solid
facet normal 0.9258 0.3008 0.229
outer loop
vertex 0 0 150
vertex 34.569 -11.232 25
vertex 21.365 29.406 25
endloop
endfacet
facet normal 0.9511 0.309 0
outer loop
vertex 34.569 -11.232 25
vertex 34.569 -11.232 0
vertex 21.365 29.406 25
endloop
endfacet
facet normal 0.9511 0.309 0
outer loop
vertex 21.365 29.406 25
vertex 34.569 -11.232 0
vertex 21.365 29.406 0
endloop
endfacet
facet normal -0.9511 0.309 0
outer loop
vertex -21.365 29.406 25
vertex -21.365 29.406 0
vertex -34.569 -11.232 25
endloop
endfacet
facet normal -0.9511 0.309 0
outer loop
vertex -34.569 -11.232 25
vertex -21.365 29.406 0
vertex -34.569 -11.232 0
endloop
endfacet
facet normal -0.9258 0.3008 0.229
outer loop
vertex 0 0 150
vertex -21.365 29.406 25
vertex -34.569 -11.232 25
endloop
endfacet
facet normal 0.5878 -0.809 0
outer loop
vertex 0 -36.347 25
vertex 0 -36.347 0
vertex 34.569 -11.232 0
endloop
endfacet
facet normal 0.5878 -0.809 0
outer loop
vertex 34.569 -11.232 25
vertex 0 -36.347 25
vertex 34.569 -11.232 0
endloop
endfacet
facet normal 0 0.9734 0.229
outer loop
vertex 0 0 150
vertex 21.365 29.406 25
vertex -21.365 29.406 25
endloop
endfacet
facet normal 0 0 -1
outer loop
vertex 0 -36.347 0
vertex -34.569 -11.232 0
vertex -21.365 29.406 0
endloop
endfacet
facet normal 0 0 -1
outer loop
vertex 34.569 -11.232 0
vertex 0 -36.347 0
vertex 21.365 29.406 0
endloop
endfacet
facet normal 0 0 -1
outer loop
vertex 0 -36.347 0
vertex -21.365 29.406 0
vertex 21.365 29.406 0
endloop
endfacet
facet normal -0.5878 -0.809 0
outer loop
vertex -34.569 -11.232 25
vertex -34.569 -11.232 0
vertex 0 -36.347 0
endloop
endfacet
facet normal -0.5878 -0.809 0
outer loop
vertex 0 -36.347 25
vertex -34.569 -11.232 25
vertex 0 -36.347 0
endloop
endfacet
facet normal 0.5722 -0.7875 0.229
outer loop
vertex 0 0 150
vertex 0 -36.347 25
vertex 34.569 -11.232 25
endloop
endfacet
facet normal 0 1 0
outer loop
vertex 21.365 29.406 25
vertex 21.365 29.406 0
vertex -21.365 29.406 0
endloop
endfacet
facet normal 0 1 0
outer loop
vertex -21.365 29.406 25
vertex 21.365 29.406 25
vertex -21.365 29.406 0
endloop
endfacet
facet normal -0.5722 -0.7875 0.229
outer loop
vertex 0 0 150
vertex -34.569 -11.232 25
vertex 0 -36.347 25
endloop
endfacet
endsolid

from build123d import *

# Parameters (mm, degrees)
F1_DEPTH = 25


with BuildPart() as f1:
    # F0 (on Top) → F1 (new body)
    with BuildSketch(Plane.XY):
        Polygon((21.36452, 29.405739), (-21.36452, 29.405739), (-34.56852, -11.231993), (0, -36.347493), (34.56852, -11.231993), align=None)
    extrude(amount=F1_DEPTH)

    # F1_face (on face) → F4 section 0
    with BuildSketch(Plane.XY.offset(25), mode=Mode.PRIVATE) as f4_s0:
        Polygon((34.56852, -11.231993), (21.36452, 29.405739), (-21.36452, 29.405739), (-34.56852, -11.231993), (0, -36.347493), align=None)
    loft([f4_s0.sketch, Vertex(0, 0, 150)])


solid = f1.part
